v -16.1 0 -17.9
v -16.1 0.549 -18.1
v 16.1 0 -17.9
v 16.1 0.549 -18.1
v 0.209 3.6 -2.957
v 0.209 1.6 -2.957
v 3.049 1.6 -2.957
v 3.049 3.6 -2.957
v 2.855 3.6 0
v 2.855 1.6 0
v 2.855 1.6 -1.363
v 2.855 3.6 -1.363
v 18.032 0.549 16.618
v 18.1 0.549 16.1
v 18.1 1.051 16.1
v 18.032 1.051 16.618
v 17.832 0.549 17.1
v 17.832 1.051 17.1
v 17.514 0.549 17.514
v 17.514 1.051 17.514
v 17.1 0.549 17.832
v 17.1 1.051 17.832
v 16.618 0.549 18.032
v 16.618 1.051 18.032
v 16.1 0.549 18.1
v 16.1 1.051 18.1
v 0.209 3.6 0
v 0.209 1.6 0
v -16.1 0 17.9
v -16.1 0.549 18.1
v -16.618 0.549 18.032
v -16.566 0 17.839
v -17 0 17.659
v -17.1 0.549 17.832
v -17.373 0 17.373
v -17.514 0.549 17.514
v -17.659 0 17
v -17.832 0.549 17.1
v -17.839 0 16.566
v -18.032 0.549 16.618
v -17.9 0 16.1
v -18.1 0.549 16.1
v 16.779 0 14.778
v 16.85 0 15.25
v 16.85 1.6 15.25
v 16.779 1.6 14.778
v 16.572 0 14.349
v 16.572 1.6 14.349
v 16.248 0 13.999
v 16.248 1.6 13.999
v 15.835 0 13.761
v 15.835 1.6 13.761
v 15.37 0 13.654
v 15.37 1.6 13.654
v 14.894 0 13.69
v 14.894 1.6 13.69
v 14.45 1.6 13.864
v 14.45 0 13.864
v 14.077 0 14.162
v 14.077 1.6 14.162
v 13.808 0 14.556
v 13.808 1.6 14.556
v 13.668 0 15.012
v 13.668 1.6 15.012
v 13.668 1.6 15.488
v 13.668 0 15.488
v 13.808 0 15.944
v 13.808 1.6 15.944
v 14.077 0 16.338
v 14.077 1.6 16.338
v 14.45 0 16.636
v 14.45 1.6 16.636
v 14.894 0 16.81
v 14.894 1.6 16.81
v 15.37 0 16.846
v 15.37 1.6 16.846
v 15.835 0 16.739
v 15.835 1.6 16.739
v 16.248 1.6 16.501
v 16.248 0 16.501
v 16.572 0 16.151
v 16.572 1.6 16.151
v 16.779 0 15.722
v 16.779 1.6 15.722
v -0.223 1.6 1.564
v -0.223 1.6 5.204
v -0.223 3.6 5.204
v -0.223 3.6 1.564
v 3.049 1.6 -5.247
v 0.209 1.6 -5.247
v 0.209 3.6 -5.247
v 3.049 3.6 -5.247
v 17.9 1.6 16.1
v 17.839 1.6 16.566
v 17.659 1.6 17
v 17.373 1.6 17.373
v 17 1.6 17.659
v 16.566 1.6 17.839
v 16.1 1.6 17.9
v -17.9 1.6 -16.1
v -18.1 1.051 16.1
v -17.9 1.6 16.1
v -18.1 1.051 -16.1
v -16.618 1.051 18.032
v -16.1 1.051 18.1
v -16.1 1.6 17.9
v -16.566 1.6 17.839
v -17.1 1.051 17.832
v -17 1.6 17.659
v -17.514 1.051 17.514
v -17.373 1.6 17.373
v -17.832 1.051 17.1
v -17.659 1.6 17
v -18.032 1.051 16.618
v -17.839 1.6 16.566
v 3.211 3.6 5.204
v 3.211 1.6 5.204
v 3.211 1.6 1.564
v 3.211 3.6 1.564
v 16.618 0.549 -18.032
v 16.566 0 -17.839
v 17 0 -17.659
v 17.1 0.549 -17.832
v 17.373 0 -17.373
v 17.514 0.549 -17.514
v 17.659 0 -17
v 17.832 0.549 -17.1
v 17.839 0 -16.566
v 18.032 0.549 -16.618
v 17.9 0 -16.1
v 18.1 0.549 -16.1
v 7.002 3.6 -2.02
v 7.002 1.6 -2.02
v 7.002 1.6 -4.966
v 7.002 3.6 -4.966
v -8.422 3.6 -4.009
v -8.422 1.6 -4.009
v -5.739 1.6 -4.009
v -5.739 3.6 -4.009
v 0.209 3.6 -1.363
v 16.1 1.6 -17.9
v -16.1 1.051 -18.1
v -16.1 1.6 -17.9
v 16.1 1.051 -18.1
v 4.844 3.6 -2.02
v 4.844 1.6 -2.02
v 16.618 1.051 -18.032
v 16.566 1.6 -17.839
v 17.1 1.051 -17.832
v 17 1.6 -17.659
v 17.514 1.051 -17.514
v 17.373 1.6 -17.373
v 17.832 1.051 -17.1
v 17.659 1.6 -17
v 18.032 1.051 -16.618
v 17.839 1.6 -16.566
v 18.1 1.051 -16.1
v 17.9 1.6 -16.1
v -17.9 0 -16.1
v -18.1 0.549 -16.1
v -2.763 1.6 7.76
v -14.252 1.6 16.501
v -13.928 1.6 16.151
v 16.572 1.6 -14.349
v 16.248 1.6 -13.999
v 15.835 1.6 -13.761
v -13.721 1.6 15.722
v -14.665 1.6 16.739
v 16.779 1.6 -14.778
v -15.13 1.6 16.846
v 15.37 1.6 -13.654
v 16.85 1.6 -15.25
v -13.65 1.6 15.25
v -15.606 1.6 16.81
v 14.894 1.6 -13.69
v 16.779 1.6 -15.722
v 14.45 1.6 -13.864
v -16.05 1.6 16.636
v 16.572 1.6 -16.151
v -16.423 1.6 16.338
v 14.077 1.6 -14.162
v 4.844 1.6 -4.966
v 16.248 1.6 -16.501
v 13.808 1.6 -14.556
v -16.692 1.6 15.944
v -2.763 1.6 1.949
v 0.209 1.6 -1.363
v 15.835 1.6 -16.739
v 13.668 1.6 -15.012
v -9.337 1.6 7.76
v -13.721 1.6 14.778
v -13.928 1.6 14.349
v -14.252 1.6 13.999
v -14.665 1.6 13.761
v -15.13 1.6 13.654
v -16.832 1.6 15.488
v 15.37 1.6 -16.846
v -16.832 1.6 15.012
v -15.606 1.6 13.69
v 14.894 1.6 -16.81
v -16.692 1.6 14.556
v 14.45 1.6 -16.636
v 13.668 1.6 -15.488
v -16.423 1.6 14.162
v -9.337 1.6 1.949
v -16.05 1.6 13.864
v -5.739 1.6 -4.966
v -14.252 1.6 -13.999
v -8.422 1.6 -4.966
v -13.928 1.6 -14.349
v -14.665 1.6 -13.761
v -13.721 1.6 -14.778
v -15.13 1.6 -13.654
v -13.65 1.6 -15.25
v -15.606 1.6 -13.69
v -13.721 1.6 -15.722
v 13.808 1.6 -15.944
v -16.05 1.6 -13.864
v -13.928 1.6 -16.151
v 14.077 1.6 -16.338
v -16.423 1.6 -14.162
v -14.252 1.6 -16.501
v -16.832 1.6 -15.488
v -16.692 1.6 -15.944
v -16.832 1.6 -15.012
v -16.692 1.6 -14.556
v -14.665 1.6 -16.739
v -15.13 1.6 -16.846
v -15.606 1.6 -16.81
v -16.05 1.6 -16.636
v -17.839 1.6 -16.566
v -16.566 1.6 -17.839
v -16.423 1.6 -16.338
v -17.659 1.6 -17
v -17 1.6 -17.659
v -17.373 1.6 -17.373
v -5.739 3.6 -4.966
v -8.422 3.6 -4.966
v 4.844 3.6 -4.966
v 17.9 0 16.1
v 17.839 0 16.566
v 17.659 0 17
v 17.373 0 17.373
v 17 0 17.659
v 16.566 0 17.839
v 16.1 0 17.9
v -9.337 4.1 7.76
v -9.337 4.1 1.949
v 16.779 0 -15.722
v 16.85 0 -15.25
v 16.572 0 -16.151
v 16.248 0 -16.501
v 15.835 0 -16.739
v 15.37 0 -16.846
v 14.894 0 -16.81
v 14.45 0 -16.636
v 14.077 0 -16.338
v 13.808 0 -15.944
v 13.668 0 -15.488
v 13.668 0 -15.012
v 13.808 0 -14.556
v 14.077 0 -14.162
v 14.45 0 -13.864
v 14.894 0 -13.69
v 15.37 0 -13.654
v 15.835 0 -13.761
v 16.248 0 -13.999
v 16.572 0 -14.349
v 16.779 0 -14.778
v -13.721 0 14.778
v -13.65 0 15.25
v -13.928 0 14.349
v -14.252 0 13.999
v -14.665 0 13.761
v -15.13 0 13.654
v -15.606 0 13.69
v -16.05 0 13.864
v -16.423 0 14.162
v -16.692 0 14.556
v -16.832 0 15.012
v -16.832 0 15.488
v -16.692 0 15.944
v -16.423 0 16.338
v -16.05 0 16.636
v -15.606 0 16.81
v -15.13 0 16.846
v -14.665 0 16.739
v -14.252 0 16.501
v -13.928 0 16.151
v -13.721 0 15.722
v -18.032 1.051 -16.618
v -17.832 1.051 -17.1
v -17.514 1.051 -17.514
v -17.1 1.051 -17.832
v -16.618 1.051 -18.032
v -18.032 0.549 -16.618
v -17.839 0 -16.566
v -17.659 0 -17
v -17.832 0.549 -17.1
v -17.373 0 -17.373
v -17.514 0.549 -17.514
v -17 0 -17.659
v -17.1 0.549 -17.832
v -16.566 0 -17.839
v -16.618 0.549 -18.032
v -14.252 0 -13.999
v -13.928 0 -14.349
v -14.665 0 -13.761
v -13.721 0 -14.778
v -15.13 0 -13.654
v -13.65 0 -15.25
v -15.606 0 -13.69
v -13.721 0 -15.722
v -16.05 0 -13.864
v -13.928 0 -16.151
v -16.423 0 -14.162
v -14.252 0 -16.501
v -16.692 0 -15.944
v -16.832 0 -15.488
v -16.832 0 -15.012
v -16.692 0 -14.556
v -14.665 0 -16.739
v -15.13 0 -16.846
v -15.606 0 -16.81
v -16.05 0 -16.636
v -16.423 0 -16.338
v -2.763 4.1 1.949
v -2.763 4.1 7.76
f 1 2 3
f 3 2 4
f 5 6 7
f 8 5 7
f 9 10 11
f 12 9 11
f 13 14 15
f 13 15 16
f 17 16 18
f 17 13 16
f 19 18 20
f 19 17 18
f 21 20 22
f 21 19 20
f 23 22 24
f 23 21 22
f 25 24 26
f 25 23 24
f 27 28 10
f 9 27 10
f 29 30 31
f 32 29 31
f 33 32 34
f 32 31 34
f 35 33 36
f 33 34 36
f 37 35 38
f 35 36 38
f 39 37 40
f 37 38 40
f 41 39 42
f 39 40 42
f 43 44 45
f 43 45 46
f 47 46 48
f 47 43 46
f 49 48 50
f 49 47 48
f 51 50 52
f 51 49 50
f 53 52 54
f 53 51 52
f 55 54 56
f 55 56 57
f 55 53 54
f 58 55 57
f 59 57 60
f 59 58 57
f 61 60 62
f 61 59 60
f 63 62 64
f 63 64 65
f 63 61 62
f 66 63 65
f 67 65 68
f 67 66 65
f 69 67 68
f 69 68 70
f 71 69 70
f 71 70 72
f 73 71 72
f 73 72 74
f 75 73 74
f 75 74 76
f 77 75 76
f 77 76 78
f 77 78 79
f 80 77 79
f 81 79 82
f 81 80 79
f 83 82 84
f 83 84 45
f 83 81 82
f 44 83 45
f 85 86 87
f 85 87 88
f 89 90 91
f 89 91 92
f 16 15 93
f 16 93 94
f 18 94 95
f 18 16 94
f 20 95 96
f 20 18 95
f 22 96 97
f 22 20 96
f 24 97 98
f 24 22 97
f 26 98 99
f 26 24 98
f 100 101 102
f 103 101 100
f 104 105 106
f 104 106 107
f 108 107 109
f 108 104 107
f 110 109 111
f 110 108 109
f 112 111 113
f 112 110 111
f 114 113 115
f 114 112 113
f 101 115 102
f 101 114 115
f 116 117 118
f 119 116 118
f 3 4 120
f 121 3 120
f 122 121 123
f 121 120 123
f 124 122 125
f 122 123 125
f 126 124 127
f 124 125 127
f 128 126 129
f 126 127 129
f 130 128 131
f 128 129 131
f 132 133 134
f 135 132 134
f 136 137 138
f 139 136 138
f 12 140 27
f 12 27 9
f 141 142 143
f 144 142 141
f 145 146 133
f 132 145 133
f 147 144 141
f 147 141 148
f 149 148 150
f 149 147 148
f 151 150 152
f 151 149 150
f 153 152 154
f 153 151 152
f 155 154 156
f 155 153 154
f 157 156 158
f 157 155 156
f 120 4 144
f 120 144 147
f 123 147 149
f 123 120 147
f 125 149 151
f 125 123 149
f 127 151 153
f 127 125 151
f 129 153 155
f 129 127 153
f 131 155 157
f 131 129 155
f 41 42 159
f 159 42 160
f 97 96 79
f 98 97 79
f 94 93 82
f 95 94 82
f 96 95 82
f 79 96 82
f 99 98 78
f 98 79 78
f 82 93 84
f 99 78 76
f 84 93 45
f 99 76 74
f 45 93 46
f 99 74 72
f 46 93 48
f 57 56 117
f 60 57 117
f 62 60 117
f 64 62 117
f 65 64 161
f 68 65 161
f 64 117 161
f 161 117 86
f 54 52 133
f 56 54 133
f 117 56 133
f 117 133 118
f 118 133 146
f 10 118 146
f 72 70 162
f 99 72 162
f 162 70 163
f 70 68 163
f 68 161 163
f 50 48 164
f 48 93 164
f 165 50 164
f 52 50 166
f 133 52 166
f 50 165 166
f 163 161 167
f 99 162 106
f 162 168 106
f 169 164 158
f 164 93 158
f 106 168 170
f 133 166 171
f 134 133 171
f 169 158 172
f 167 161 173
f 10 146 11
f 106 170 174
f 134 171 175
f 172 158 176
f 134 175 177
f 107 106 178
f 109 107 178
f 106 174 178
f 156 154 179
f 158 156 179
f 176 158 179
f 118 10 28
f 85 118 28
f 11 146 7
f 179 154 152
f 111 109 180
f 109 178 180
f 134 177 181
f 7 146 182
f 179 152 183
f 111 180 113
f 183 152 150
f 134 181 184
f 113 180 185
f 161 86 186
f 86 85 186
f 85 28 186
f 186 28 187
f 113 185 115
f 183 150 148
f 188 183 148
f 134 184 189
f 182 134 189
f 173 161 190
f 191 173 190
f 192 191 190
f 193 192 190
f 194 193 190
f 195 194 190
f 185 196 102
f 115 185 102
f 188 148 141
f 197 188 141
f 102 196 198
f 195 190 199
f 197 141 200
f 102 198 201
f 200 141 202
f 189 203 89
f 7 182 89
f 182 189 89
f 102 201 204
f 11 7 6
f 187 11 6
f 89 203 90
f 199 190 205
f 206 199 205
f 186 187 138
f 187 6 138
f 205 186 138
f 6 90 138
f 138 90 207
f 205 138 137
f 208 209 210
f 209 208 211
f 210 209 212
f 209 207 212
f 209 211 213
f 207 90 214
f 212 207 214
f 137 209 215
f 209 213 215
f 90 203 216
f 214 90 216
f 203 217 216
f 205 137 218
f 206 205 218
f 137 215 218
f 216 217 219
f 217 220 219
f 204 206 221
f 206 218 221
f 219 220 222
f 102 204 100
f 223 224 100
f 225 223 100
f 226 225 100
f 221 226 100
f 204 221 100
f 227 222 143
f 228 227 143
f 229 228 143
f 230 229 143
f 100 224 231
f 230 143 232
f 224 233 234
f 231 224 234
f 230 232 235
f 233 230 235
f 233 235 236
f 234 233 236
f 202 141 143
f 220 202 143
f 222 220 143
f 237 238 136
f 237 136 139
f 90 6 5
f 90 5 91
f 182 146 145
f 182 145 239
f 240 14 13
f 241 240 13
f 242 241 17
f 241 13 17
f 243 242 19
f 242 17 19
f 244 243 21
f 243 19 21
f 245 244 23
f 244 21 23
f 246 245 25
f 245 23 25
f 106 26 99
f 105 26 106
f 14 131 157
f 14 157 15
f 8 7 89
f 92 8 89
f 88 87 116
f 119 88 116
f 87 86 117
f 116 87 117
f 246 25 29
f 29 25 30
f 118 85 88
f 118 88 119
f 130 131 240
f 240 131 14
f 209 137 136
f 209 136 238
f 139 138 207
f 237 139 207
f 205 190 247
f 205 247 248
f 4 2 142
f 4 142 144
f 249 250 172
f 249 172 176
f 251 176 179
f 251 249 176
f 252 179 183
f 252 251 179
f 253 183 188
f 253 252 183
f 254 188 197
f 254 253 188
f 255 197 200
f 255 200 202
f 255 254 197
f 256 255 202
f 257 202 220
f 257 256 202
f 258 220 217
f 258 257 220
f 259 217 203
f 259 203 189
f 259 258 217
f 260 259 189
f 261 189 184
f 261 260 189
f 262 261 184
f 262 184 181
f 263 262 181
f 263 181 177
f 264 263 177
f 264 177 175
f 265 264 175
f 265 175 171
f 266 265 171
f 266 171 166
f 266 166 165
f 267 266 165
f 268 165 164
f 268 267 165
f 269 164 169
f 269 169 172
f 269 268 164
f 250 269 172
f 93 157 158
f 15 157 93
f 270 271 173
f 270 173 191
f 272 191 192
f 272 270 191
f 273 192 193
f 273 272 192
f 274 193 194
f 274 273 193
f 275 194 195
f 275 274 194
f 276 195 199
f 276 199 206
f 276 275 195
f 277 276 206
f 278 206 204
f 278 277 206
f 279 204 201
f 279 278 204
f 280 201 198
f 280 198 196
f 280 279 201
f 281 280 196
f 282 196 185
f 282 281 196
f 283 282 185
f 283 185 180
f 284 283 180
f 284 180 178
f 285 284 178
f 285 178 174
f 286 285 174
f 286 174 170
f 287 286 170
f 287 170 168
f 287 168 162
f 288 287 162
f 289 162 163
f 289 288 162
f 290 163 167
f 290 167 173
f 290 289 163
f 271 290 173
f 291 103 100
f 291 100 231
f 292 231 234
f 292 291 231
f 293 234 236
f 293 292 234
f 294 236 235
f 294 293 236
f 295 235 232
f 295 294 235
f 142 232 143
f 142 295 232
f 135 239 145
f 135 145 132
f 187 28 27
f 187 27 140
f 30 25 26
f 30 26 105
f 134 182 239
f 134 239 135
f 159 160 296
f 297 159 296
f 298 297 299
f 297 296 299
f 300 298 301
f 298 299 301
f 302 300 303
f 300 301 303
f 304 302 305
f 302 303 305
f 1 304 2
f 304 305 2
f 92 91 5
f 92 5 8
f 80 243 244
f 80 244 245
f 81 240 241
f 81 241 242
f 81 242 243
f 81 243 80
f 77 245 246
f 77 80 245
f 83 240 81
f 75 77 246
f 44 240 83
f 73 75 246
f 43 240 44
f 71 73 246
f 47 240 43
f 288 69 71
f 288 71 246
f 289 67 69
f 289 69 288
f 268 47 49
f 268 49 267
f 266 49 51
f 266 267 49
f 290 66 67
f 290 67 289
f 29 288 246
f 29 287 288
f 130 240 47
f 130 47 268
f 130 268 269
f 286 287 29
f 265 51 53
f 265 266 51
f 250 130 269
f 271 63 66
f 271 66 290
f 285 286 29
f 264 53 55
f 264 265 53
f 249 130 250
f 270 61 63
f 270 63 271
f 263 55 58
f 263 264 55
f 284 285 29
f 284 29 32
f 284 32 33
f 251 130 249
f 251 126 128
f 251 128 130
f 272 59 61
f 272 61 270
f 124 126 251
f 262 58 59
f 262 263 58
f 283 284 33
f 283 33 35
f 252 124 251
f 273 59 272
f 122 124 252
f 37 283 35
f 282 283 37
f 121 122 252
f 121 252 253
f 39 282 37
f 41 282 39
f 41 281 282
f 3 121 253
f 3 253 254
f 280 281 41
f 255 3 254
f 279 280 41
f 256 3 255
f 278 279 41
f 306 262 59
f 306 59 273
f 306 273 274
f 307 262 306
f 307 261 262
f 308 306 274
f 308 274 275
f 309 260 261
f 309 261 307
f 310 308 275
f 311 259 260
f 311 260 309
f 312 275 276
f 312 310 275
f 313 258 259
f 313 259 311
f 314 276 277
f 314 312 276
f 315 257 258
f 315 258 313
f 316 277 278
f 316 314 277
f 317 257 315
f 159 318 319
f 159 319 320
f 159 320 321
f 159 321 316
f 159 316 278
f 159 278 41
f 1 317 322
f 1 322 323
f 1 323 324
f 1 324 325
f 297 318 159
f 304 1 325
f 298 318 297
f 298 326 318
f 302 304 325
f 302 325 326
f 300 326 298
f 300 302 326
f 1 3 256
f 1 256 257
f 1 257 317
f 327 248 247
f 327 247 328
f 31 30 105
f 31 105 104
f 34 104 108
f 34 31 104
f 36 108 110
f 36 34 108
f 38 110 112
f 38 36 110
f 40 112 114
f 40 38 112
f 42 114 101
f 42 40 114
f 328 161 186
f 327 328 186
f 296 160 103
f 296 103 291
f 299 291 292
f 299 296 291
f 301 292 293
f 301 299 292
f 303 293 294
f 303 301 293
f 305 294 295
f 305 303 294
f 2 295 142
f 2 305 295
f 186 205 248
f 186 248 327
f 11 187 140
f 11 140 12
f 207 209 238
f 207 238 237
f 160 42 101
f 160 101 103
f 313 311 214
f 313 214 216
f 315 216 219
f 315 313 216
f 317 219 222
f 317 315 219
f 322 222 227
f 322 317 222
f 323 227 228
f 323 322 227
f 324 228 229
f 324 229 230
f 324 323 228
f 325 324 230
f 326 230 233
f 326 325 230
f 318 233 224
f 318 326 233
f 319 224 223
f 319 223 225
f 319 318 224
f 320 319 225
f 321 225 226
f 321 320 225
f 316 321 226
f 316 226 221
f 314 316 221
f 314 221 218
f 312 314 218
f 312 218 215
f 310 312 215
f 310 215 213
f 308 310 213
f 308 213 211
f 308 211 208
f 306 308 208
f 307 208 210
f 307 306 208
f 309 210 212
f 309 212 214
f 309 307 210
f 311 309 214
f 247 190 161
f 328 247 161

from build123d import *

# Parameters (mm, degrees)
ESQUISSE1_R        = 1.6
BOSS_EXTRU_1_DEPTH = 1.6
CHANFREIN1_SIZE    = 0.2
CHANFREIN1_SIZE2   = 0.549495484
CHANFREIN2_SIZE    = 0.2
CHANFREIN2_SIZE2   = 0.549495484
ESQUISSE4_W        = 6.573690578
ESQUISSE4_H        = 5.811523554
BOSS_EXTRU_2_DEPTH = 2.5
ESQUISSE5_W        = 2.839601435
ESQUISSE5_H        = 2.289720849
ESQUISSE5_W_2      = 2.157836197
ESQUISSE5_H_2      = 2.945915503
ESQUISSE5_W_3      = 2.645694815
ESQUISSE5_H_3      = 1.363110326
ESQUISSE5_W_4      = 3.433774122
ESQUISSE5_H_4      = 3.640175845
ESQUISSE5_W_5      = 2.683222401
ESQUISSE5_H_5      = 0.956953443
BOSS_EXTRU_3_DEPTH = 2


with BuildPart() as part:
    # Esquisse1 → Boss.-Extru.1 (new body)
    with BuildSketch(Plane(origin=(0, 0, 0), x_dir=(1, 0, 0), z_dir=(0, 1, 0))):
        with BuildLine():
            Line((16.1, -18.1), (-16.1, -18.1))
            ThreePointArc((-16.1, -18.1), (-17.514213562, -17.514213562), (-18.1, -16.1))
            Line((-18.1, -16.1), (-18.1, 16.1))
            ThreePointArc((-18.1, 16.1), (-17.514213562, 17.514213562), (-16.1, 18.1))
            Line((-16.1, 18.1), (16.1, 18.1))
            ThreePointArc((16.1, 18.1), (17.514213562, 17.514213562), (18.1, 16.1))
            Line((18.1, 16.1), (18.1, -16.1))
            ThreePointArc((18.1, -16.1), (17.514213562, -17.514213562), (16.1, -18.1))
        make_face()
        with Locations((-15.25, 15.25)):
            Circle(ESQUISSE1_R, mode=Mode.SUBTRACT)
        with Locations((15.25, 15.25)):
            Circle(ESQUISSE1_R, mode=Mode.SUBTRACT)
        with Locations((15.25, -15.25)):
            Circle(ESQUISSE1_R, mode=Mode.SUBTRACT)
        with Locations((-15.25, -15.25)):
            Circle(ESQUISSE1_R, mode=Mode.SUBTRACT)
    extrude(amount=BOSS_EXTRU_1_DEPTH)

    # Chanfrein1
    chanfrein1_edges = [part.edges().sort_by_distance(p)[0] for p in [
        (17.514213562, 1.6, -17.514213562),
        (0, 1.6, -18.1),
        (-17.514213562, 1.6, -17.514213562),
        (-18.1, 1.6, 0),
        (-17.514213562, 1.6, 17.514213562),
        (0, 1.6, 18.1),
        (17.514213562, 1.6, 17.514213562),
        (18.1, 1.6, 0),
    ]]
    chanfrein1_side = [part.faces().sort_by_distance(p)[0] for p in [
        (0, 1.6, 0),
    ]]
    chamfer(chanfrein1_edges, length=CHANFREIN1_SIZE, length2=CHANFREIN1_SIZE2, reference=chanfrein1_side[0])

    # Chanfrein2
    chanfrein2_edges = [part.edges().sort_by_distance(p)[0] for p in [
        (18.1, 0, 0),
        (17.514213562, 0, 17.514213562),
        (0, 0, 18.1),
        (-17.514213562, 0, 17.514213562),
        (-18.1, 0, 0),
        (-17.514213562, 0, -17.514213562),
        (0, 0, -18.1),
        (17.514213562, 0, -17.514213562),
    ]]
    chanfrein2_side = [part.faces().sort_by_distance(p)[0] for p in [
        (0, 0, 0),
    ]]
    chamfer(chanfrein2_edges, length=CHANFREIN2_SIZE, length2=CHANFREIN2_SIZE2, reference=chanfrein2_side[0])

    # Esquisse4 → Boss.-Extru.2 (add)
    with BuildSketch(Plane(origin=(0, 1.6, 0), x_dir=(1, 0, 0), z_dir=(0, 1, 0))):
        with Locations((-6.049700749, -4.854717359)):
            Rectangle(ESQUISSE4_W, ESQUISSE4_H)
    extrude(amount=BOSS_EXTRU_2_DEPTH)

    # Esquisse5 → Boss.-Extru.3 (add)
    with BuildSketch(Plane(origin=(0, 1.6, 0), x_dir=(1, 0, 0), z_dir=(0, 1, 0))):
        with Locations((1.628867377, 4.102355057)):
            Rectangle(ESQUISSE5_W, ESQUISSE5_H)
        with Locations((5.922641632, 3.492800834)):
            Rectangle(ESQUISSE5_W_2, ESQUISSE5_H_2)
        with Locations((1.531914066, 0.681555163)):
            Rectangle(ESQUISSE5_W_3, ESQUISSE5_H_3)
        with Locations((1.49438648, -3.384129307)):
            Rectangle(ESQUISSE5_W_4, ESQUISSE5_H_4)
        with Locations((-7.080666928, 4.487281863)):
            Rectangle(ESQUISSE5_W_5, ESQUISSE5_H_5)
    extrude(amount=BOSS_EXTRU_3_DEPTH)


solid = part.part
